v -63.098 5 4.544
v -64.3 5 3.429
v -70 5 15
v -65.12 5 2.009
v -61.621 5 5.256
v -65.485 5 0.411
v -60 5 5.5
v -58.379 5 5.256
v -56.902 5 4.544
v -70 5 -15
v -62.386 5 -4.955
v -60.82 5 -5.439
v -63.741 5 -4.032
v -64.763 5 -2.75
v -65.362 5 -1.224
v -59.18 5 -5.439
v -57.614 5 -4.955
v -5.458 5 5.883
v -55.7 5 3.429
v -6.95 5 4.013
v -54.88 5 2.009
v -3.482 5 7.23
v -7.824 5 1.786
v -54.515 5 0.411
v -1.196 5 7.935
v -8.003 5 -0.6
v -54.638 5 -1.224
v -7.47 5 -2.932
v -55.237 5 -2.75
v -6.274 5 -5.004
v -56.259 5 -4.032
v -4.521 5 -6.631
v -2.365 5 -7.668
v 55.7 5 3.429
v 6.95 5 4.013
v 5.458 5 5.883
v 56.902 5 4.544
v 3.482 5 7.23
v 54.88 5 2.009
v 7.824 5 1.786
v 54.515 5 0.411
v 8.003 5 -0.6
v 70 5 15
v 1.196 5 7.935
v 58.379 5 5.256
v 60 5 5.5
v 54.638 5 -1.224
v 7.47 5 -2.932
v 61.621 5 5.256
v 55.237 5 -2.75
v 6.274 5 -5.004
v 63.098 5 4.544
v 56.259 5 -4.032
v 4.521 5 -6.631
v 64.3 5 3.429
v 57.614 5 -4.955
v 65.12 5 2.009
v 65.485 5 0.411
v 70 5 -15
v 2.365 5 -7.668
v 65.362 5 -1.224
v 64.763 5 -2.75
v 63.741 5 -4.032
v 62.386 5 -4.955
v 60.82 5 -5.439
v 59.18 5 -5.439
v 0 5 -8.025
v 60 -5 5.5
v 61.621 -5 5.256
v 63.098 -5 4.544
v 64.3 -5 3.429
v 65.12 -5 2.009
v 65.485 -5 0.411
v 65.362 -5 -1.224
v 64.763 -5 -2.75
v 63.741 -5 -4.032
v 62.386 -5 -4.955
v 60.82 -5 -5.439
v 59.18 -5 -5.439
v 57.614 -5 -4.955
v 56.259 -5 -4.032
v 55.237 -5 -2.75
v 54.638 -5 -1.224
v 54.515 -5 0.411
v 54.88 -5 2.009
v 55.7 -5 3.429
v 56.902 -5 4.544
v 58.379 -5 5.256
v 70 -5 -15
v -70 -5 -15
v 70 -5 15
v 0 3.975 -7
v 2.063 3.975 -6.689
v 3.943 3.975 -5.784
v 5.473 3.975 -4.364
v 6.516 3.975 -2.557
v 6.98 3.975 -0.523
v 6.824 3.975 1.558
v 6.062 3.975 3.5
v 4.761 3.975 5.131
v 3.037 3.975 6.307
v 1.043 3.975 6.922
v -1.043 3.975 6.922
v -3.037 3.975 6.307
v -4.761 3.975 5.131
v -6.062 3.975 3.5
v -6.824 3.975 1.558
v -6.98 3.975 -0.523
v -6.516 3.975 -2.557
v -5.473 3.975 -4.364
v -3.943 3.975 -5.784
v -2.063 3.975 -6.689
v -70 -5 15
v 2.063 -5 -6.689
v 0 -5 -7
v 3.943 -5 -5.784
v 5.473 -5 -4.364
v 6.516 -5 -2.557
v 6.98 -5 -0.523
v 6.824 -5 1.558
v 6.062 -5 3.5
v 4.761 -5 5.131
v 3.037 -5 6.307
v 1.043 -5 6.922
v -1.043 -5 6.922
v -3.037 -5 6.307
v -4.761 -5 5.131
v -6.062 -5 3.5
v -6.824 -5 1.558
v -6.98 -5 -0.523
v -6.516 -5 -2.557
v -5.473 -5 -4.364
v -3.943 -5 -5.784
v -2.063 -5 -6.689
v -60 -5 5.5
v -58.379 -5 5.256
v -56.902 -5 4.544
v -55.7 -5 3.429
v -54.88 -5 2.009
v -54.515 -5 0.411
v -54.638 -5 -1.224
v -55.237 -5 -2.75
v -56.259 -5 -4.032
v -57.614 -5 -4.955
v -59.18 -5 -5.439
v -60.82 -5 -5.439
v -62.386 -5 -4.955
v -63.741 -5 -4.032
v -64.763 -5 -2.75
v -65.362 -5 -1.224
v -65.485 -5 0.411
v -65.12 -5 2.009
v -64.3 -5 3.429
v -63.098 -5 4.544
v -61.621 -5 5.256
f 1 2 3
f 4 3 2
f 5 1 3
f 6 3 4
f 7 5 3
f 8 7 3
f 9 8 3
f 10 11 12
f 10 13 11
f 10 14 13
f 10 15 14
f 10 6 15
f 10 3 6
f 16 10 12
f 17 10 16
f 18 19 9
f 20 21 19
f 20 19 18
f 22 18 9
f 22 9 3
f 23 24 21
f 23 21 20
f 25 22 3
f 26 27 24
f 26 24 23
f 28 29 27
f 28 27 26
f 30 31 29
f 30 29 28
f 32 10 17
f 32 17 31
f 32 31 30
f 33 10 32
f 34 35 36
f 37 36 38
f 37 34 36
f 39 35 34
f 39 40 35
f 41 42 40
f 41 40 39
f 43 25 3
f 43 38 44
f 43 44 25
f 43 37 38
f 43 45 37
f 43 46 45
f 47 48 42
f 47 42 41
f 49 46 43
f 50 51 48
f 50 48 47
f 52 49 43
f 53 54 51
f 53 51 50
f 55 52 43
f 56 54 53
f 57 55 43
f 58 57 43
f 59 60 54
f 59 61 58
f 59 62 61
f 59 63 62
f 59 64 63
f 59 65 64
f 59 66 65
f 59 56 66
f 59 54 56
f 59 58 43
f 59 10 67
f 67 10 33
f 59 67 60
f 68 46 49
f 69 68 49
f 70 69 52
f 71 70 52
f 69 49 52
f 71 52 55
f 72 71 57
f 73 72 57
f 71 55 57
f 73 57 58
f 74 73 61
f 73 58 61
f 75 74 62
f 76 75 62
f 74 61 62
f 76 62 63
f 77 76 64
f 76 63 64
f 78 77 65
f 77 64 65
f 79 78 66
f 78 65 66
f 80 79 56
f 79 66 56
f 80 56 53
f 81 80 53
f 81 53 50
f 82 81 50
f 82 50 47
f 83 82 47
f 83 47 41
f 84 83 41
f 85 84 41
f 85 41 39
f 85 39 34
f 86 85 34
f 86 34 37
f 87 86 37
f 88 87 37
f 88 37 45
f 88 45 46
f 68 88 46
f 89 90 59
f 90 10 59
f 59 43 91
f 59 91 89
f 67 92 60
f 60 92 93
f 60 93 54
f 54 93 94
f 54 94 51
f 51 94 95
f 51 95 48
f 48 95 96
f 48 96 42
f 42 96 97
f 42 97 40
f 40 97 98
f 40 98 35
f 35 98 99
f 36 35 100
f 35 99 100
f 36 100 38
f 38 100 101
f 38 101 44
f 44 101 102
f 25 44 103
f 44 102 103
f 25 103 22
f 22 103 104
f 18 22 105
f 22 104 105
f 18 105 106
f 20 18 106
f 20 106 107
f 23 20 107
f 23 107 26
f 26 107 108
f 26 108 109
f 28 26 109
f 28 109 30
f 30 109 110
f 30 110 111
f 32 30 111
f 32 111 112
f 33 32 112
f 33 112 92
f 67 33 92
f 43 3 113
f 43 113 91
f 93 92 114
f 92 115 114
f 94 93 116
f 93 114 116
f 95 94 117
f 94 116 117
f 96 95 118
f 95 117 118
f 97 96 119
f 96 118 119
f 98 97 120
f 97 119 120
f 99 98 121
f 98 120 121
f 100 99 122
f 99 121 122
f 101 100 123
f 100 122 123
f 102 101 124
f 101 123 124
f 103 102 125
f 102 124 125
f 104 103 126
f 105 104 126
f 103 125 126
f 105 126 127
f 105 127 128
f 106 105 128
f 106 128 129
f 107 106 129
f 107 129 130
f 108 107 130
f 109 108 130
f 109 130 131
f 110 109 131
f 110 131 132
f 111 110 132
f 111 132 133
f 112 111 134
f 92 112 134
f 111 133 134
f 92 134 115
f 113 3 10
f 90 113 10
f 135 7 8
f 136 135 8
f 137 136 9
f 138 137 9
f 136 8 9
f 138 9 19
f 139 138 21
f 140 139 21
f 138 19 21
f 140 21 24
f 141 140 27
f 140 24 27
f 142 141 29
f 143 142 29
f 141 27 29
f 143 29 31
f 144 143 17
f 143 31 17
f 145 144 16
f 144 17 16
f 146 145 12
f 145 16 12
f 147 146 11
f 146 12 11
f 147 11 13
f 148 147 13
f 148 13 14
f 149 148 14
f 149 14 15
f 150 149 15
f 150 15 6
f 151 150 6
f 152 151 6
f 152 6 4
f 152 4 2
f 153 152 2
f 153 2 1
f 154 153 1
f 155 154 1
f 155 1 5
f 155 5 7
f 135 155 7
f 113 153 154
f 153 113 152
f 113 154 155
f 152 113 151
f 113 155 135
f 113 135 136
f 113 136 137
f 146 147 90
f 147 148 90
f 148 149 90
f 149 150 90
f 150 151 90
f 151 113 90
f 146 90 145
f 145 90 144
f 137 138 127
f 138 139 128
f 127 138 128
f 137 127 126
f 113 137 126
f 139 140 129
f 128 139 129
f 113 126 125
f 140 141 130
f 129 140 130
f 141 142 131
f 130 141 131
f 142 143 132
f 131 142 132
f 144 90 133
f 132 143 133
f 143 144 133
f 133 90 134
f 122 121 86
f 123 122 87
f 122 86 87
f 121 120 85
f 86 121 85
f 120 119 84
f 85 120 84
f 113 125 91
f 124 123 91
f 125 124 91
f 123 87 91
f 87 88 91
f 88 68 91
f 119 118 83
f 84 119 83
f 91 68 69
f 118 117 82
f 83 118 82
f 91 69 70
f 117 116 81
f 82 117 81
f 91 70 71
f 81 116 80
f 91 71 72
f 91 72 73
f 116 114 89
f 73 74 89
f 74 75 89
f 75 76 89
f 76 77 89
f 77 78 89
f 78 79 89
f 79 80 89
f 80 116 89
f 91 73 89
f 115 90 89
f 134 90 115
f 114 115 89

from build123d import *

# Parameters (mm, degrees)
SKETCH4_W                    = 140
SKETCH4_H                    = 30
BOSS_EXTRUDE2_DEPTH          = 5
SKETCH5_R                    = 5.5
CUT_EXTRUDE1_DEPTH           = 63
M16_TAPPED_HOLE1_D           = 14
M16_TAPPED_HOLE1_DEPTH       = 38
M16_TAPPED_HOLE1_CSINK_D     = 16.05
M16_TAPPED_HOLE1_CSINK_ANGLE = 90
M16_TAPPED_HOLE1_TIP         = 4.206024333


with BuildPart() as part:
    # Sketch4 → Boss-Extrude2 (new, symmetric)
    with BuildSketch(Plane(origin=(0, 0, 0), x_dir=(1, 0, 0), z_dir=(0, 1, 0))):
        Rectangle(SKETCH4_W, SKETCH4_H)
    extrude(amount=BOSS_EXTRUDE2_DEPTH, both=True)

    # Sketch5 → Cut-Extrude1 (cut)
    with BuildSketch(Plane(origin=(0, 5, 0), x_dir=(1, 0, 0), z_dir=(0, 1, 0))):
        with Locations(Location((-60, 0, 0), (0, 0, 270))):
            Circle(SKETCH5_R)
        with Locations(Location((60, 0, 0), (0, 0, 270))):
            Circle(SKETCH5_R)
    extrude(amount=-CUT_EXTRUDE1_DEPTH, mode=Mode.SUBTRACT)

    # M16 Tapped Hole1
    with Locations(Plane.ZX.offset(5)):
        with Locations((0, 0)):
            CounterSinkHole(M16_TAPPED_HOLE1_D / 2, M16_TAPPED_HOLE1_CSINK_D / 2, depth=M16_TAPPED_HOLE1_DEPTH, counter_sink_angle=M16_TAPPED_HOLE1_CSINK_ANGLE)
            with Locations((0, 0, -(M16_TAPPED_HOLE1_DEPTH + M16_TAPPED_HOLE1_TIP / 2))):  # 118° drill point
                Cone(0, M16_TAPPED_HOLE1_D / 2, M16_TAPPED_HOLE1_TIP, mode=Mode.SUBTRACT)


solid = part.part
